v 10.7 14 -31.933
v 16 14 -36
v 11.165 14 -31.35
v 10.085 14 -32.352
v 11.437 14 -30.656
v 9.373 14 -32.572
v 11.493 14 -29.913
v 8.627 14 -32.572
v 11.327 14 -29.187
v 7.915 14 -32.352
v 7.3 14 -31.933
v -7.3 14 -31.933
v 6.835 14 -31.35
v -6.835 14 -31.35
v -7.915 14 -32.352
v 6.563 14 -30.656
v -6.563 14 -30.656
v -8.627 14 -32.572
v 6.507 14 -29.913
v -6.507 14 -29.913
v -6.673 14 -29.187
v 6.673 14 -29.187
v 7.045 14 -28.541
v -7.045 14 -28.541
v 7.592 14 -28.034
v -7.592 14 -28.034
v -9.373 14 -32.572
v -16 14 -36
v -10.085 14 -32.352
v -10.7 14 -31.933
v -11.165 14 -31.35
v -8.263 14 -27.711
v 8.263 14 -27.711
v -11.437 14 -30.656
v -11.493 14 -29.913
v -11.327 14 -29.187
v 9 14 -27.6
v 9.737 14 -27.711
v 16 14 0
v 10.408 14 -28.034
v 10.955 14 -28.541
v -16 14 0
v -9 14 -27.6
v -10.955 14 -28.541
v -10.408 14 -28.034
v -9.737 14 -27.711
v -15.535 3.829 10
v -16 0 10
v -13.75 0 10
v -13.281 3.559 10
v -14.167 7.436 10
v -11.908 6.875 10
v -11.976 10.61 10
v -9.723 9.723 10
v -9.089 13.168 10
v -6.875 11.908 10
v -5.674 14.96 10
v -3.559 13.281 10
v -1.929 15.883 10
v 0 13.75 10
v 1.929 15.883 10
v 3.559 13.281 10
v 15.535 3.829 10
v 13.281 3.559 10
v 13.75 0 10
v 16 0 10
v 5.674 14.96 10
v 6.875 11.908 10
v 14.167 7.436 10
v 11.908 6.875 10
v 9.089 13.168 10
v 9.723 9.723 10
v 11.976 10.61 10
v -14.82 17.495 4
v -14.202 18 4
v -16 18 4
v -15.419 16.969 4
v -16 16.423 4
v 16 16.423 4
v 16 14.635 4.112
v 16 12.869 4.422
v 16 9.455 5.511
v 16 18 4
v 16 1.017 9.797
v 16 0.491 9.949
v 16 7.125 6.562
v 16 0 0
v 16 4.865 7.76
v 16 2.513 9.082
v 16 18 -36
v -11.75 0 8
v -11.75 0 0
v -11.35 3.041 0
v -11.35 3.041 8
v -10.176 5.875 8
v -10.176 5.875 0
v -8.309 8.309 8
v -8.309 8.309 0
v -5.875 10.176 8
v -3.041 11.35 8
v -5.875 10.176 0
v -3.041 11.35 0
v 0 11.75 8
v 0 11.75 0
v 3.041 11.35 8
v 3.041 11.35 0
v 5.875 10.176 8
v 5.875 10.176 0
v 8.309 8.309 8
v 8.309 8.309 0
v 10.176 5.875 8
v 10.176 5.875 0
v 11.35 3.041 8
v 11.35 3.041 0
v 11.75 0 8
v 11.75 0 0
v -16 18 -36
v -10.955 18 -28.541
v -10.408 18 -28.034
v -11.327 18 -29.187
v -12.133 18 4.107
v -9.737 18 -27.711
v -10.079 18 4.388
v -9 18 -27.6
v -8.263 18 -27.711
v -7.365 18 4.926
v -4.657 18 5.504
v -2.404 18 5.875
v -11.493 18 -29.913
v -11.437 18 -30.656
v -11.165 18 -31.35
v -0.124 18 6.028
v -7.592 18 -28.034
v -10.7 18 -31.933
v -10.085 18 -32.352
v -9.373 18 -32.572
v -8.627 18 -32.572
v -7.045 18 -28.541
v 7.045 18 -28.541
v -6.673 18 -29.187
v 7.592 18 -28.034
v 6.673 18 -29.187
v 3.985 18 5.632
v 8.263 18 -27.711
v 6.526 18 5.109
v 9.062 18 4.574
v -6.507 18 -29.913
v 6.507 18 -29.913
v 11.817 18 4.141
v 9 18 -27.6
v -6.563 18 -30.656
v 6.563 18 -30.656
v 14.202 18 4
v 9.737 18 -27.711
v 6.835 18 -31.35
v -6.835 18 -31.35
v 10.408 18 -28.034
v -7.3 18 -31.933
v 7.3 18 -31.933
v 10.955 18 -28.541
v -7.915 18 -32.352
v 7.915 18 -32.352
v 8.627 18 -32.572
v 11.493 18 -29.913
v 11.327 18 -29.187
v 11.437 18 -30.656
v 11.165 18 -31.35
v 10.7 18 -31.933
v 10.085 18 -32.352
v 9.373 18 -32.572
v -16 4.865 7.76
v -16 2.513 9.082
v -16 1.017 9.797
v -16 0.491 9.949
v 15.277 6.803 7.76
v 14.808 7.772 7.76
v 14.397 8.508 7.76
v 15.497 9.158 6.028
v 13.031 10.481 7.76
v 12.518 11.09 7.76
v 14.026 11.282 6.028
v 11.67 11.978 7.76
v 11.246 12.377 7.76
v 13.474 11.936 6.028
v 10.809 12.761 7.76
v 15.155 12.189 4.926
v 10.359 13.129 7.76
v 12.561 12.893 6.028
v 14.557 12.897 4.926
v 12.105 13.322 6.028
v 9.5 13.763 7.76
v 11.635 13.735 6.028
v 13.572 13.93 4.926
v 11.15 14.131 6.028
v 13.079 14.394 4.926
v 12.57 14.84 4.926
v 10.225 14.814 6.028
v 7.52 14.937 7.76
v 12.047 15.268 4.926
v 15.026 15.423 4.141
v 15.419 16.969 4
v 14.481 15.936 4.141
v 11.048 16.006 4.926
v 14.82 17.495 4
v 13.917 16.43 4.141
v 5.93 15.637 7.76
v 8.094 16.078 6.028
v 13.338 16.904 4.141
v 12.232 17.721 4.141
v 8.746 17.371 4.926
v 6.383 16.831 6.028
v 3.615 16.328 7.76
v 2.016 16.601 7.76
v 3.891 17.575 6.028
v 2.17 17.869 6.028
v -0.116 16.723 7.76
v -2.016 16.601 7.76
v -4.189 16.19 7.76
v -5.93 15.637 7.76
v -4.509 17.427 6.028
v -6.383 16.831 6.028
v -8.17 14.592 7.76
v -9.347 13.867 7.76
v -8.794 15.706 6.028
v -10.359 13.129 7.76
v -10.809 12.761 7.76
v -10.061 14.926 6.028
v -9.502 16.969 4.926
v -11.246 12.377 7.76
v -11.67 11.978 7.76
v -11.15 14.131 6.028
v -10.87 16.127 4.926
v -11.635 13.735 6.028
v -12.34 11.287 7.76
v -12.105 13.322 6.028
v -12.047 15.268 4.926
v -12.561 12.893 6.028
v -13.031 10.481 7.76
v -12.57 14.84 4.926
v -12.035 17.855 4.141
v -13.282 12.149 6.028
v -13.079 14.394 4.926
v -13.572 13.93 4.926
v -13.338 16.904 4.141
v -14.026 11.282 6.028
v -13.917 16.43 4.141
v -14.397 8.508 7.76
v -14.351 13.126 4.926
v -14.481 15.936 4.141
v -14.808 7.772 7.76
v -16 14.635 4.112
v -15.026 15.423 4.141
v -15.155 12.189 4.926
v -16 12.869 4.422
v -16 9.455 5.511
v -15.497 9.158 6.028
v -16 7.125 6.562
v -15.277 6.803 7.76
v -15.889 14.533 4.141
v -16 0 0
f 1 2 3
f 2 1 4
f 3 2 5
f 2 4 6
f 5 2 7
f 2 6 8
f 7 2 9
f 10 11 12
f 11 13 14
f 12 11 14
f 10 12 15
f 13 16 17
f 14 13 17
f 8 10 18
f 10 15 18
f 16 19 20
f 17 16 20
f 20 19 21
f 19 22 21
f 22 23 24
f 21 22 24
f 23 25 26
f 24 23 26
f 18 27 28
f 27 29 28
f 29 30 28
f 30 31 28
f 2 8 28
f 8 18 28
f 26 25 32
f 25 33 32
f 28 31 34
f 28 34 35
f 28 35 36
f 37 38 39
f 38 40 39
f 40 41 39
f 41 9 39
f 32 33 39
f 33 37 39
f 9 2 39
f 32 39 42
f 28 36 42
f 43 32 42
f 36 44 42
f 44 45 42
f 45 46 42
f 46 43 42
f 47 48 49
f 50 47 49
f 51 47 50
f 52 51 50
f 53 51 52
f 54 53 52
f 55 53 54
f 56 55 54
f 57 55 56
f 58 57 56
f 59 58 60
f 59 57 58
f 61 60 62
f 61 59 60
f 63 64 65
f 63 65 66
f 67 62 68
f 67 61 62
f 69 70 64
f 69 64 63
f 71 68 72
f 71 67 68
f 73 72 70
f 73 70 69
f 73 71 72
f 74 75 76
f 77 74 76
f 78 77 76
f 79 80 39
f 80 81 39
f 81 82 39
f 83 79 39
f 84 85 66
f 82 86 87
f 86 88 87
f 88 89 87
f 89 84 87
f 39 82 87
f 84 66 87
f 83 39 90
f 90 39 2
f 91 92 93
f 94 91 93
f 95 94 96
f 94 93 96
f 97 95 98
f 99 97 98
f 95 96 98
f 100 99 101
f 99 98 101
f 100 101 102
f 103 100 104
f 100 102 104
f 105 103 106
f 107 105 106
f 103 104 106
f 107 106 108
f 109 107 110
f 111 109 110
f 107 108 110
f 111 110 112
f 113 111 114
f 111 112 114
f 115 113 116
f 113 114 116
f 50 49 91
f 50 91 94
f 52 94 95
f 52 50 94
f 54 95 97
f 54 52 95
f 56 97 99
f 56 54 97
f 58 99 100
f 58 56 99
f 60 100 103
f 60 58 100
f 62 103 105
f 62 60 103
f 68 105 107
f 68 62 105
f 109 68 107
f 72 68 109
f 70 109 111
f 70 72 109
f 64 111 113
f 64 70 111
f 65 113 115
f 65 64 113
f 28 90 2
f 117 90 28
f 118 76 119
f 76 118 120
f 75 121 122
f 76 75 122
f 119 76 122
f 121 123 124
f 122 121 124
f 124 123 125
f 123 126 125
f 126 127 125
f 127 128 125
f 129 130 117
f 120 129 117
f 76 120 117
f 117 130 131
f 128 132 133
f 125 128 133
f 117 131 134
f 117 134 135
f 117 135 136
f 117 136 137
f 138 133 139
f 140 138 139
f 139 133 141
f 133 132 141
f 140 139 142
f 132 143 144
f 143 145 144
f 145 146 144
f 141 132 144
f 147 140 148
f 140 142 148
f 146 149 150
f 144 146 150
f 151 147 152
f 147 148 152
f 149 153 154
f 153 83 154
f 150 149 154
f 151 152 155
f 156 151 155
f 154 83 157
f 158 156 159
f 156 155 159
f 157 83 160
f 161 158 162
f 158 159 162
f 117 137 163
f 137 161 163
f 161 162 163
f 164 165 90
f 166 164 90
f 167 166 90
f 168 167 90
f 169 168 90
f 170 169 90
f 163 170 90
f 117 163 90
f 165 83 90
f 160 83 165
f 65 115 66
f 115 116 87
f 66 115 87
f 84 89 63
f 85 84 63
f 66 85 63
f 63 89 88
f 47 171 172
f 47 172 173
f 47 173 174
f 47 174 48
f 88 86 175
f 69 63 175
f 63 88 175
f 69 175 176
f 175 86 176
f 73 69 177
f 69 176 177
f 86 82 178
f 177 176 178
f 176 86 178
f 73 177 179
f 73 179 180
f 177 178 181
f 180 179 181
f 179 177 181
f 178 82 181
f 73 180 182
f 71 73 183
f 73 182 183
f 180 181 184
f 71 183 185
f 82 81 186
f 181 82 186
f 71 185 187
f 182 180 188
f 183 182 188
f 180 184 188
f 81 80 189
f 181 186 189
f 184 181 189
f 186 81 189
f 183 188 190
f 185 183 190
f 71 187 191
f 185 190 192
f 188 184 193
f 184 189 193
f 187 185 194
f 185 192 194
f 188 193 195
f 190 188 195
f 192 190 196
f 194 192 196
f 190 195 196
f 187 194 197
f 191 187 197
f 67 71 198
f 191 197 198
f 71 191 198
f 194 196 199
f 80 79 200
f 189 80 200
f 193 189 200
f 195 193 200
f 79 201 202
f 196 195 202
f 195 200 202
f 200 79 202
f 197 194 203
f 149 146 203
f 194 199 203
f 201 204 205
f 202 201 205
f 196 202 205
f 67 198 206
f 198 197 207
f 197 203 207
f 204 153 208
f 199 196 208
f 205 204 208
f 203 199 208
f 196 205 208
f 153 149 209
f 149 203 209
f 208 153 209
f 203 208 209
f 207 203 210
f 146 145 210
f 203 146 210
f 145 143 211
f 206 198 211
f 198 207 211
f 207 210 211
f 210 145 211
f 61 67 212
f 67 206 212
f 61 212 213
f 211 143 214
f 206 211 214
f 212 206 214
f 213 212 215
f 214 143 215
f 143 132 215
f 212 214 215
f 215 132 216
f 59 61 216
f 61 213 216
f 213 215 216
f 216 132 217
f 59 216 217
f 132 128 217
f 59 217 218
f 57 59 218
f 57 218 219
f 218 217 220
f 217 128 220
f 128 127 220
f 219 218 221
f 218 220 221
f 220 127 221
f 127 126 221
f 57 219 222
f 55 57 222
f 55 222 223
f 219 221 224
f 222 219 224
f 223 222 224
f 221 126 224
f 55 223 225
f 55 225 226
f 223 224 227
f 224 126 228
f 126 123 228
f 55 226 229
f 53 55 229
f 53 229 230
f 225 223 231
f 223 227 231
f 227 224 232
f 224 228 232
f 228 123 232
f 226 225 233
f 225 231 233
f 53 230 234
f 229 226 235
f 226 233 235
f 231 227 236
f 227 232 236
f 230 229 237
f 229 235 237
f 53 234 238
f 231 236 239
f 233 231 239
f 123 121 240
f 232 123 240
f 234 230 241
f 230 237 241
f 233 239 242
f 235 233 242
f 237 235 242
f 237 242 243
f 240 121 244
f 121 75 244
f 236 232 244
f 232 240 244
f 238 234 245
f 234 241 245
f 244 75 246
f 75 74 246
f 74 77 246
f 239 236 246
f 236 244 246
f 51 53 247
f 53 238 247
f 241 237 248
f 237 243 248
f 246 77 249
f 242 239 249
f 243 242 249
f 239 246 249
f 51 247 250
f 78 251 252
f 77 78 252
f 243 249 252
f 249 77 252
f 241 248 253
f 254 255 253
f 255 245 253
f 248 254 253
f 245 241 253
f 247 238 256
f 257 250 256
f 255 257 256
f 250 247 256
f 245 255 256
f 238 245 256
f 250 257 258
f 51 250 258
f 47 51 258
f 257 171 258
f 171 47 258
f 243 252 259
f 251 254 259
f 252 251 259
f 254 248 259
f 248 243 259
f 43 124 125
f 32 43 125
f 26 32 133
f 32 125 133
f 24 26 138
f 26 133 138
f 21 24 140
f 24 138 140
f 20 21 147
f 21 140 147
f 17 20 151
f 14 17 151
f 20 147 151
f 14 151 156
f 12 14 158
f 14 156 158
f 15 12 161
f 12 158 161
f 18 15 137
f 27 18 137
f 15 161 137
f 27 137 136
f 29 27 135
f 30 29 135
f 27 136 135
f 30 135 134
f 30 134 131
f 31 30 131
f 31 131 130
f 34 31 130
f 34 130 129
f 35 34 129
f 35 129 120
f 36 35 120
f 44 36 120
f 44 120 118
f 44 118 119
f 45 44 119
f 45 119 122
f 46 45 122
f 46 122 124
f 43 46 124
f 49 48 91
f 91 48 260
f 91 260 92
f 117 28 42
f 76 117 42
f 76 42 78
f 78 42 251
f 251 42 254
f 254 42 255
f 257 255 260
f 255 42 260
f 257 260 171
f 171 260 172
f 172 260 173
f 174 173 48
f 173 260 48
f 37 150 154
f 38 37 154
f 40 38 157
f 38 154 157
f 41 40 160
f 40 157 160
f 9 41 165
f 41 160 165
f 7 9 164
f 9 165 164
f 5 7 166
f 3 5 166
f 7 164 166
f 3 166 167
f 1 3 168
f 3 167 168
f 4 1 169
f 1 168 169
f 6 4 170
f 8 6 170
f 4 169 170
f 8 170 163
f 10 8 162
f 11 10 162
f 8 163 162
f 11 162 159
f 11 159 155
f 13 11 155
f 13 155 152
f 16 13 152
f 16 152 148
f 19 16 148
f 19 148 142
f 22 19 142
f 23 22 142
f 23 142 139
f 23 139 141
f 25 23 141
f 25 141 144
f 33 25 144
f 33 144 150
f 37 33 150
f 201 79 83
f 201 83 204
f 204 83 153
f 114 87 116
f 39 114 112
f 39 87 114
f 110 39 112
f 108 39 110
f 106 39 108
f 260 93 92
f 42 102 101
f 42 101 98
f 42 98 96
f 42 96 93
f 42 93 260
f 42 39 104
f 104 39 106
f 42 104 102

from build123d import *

# Parameters (mm, degrees)
BOSS_EXTRU_1_DEPTH      = 4
ESQUISSE2_W             = 32
ESQUISSE2_H             = 4
BOSS_EXTRU_2_DEPTH      = 36
BOSS_EXTRU_3_DEPTH      = 6
CONG_1_R                = 7
CHANFREIN1_SIZE         = 2
ESQUISSE4_R             = 2.5
ENL_V_MAT_EXTRU_1_DEPTH = 10


with BuildPart() as part:
    # Esquisse1 → Boss.-Extru.1 (new body)
    with BuildSketch(Plane.XY):
        with BuildLine():
            Line((-16, 18), (16, 18))
            Line((16, 18), (16, 0))
            Line((16, 0), (11.75, 0))
            ThreePointArc((11.75, 0), (0, 11.75), (-11.75, 0))
            Line((-11.75, 0), (-16, 0))
            Line((-16, 0), (-16, 18))
        make_face()
    extrude(amount=BOSS_EXTRU_1_DEPTH)

    # Esquisse2 → Boss.-Extru.2 (add)
    with BuildSketch(Plane(origin=(0, 0, 0), x_dir=(-1, 0, 0), z_dir=(0, 0, -1))):
        with Locations((0, 16)):
            Rectangle(ESQUISSE2_W, ESQUISSE2_H)
    extrude(amount=BOSS_EXTRU_2_DEPTH)

    # Esquisse3 → Boss.-Extru.3 (add)
    with BuildSketch(Plane.XY.offset(4)):
        with BuildLine():
            Line((-16, 0), (-11.75, 0))
            ThreePointArc((-11.75, 0), (0, 11.75), (11.75, 0))
            Line((11.75, 0), (16, 0))
            ThreePointArc((16, 0), (0, 16), (-16, 0))
        make_face()
    extrude(amount=BOSS_EXTRU_3_DEPTH)

    # Congé1
    # the kernel refuses this fillet: 7 mm, written as the material it adds along each edge
    with BuildSketch(Plane(origin=(0, 0, 4), x_dir=(1, 0, 0), z_dir=(0, -1, 0))) as cong_1_piece_1_section:
        with BuildLine():
            CenterArc((22.92820323, 7), CONG_1_R, 188.213210702, 81.786789298)
            Line((16, 6), (16, 0))
            Line((16, 0), (22.92820323, 0))
        make_face()
    cong_1_piece_1 = revolve(axis=Axis((0, 0, 4), (0, 0, 1)), revolution_arc=180, mode=Mode.PRIVATE)
    cong_1_piece_1 = split(cong_1_piece_1, bisect_by=Plane(origin=(0, 18, 4), z_dir=(0, -1, 0)), keep=Keep.TOP, mode=Mode.PRIVATE)
    cong_1_piece_1 = split(cong_1_piece_1, bisect_by=Plane(origin=(16, 0, 4), z_dir=(-1, 0, 0)), keep=Keep.TOP, mode=Mode.PRIVATE)
    cong_1_piece_1 = split(cong_1_piece_1, bisect_by=Plane(origin=(-16, 0, 4), z_dir=(1, 0, 0)), keep=Keep.TOP, mode=Mode.PRIVATE)
    add(cong_1_piece_1)

    # Chanfrein1
    chanfrein1_edges = [part.edges().sort_by_distance(p)[0] for p in [
        (0, 11.75, 10),
    ]]
    chamfer(chanfrein1_edges, length=CHANFREIN1_SIZE)

    # Esquisse4 → Enlèv. mat.-Extru.1 (cut)
    with BuildSketch(Plane(origin=(0, 18, 0), x_dir=(1, 0, 0), z_dir=(0, 1, 0))):
        with Locations(Location((9, 30.1, 0), (0, 0, 270))):
            Circle(ESQUISSE4_R)
        with Locations(Location((-9, 30.1, 0), (0, 0, 270))):
            Circle(ESQUISSE4_R)
    extrude(amount=-ENL_V_MAT_EXTRU_1_DEPTH, mode=Mode.SUBTRACT)


solid = part.part
